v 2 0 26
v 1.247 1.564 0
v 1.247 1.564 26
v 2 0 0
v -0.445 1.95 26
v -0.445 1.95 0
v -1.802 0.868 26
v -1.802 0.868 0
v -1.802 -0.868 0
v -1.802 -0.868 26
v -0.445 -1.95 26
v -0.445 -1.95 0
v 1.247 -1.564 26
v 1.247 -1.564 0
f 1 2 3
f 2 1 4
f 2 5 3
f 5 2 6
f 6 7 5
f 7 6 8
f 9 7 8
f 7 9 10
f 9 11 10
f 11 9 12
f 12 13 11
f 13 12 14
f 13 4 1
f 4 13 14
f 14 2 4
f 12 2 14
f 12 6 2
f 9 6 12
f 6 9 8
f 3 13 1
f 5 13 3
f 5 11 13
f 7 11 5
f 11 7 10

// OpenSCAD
module front_cylinder_upright() {
    cylinder(h=26.0, r=2);
}

// call module when run directly
front_cylinder_upright();
